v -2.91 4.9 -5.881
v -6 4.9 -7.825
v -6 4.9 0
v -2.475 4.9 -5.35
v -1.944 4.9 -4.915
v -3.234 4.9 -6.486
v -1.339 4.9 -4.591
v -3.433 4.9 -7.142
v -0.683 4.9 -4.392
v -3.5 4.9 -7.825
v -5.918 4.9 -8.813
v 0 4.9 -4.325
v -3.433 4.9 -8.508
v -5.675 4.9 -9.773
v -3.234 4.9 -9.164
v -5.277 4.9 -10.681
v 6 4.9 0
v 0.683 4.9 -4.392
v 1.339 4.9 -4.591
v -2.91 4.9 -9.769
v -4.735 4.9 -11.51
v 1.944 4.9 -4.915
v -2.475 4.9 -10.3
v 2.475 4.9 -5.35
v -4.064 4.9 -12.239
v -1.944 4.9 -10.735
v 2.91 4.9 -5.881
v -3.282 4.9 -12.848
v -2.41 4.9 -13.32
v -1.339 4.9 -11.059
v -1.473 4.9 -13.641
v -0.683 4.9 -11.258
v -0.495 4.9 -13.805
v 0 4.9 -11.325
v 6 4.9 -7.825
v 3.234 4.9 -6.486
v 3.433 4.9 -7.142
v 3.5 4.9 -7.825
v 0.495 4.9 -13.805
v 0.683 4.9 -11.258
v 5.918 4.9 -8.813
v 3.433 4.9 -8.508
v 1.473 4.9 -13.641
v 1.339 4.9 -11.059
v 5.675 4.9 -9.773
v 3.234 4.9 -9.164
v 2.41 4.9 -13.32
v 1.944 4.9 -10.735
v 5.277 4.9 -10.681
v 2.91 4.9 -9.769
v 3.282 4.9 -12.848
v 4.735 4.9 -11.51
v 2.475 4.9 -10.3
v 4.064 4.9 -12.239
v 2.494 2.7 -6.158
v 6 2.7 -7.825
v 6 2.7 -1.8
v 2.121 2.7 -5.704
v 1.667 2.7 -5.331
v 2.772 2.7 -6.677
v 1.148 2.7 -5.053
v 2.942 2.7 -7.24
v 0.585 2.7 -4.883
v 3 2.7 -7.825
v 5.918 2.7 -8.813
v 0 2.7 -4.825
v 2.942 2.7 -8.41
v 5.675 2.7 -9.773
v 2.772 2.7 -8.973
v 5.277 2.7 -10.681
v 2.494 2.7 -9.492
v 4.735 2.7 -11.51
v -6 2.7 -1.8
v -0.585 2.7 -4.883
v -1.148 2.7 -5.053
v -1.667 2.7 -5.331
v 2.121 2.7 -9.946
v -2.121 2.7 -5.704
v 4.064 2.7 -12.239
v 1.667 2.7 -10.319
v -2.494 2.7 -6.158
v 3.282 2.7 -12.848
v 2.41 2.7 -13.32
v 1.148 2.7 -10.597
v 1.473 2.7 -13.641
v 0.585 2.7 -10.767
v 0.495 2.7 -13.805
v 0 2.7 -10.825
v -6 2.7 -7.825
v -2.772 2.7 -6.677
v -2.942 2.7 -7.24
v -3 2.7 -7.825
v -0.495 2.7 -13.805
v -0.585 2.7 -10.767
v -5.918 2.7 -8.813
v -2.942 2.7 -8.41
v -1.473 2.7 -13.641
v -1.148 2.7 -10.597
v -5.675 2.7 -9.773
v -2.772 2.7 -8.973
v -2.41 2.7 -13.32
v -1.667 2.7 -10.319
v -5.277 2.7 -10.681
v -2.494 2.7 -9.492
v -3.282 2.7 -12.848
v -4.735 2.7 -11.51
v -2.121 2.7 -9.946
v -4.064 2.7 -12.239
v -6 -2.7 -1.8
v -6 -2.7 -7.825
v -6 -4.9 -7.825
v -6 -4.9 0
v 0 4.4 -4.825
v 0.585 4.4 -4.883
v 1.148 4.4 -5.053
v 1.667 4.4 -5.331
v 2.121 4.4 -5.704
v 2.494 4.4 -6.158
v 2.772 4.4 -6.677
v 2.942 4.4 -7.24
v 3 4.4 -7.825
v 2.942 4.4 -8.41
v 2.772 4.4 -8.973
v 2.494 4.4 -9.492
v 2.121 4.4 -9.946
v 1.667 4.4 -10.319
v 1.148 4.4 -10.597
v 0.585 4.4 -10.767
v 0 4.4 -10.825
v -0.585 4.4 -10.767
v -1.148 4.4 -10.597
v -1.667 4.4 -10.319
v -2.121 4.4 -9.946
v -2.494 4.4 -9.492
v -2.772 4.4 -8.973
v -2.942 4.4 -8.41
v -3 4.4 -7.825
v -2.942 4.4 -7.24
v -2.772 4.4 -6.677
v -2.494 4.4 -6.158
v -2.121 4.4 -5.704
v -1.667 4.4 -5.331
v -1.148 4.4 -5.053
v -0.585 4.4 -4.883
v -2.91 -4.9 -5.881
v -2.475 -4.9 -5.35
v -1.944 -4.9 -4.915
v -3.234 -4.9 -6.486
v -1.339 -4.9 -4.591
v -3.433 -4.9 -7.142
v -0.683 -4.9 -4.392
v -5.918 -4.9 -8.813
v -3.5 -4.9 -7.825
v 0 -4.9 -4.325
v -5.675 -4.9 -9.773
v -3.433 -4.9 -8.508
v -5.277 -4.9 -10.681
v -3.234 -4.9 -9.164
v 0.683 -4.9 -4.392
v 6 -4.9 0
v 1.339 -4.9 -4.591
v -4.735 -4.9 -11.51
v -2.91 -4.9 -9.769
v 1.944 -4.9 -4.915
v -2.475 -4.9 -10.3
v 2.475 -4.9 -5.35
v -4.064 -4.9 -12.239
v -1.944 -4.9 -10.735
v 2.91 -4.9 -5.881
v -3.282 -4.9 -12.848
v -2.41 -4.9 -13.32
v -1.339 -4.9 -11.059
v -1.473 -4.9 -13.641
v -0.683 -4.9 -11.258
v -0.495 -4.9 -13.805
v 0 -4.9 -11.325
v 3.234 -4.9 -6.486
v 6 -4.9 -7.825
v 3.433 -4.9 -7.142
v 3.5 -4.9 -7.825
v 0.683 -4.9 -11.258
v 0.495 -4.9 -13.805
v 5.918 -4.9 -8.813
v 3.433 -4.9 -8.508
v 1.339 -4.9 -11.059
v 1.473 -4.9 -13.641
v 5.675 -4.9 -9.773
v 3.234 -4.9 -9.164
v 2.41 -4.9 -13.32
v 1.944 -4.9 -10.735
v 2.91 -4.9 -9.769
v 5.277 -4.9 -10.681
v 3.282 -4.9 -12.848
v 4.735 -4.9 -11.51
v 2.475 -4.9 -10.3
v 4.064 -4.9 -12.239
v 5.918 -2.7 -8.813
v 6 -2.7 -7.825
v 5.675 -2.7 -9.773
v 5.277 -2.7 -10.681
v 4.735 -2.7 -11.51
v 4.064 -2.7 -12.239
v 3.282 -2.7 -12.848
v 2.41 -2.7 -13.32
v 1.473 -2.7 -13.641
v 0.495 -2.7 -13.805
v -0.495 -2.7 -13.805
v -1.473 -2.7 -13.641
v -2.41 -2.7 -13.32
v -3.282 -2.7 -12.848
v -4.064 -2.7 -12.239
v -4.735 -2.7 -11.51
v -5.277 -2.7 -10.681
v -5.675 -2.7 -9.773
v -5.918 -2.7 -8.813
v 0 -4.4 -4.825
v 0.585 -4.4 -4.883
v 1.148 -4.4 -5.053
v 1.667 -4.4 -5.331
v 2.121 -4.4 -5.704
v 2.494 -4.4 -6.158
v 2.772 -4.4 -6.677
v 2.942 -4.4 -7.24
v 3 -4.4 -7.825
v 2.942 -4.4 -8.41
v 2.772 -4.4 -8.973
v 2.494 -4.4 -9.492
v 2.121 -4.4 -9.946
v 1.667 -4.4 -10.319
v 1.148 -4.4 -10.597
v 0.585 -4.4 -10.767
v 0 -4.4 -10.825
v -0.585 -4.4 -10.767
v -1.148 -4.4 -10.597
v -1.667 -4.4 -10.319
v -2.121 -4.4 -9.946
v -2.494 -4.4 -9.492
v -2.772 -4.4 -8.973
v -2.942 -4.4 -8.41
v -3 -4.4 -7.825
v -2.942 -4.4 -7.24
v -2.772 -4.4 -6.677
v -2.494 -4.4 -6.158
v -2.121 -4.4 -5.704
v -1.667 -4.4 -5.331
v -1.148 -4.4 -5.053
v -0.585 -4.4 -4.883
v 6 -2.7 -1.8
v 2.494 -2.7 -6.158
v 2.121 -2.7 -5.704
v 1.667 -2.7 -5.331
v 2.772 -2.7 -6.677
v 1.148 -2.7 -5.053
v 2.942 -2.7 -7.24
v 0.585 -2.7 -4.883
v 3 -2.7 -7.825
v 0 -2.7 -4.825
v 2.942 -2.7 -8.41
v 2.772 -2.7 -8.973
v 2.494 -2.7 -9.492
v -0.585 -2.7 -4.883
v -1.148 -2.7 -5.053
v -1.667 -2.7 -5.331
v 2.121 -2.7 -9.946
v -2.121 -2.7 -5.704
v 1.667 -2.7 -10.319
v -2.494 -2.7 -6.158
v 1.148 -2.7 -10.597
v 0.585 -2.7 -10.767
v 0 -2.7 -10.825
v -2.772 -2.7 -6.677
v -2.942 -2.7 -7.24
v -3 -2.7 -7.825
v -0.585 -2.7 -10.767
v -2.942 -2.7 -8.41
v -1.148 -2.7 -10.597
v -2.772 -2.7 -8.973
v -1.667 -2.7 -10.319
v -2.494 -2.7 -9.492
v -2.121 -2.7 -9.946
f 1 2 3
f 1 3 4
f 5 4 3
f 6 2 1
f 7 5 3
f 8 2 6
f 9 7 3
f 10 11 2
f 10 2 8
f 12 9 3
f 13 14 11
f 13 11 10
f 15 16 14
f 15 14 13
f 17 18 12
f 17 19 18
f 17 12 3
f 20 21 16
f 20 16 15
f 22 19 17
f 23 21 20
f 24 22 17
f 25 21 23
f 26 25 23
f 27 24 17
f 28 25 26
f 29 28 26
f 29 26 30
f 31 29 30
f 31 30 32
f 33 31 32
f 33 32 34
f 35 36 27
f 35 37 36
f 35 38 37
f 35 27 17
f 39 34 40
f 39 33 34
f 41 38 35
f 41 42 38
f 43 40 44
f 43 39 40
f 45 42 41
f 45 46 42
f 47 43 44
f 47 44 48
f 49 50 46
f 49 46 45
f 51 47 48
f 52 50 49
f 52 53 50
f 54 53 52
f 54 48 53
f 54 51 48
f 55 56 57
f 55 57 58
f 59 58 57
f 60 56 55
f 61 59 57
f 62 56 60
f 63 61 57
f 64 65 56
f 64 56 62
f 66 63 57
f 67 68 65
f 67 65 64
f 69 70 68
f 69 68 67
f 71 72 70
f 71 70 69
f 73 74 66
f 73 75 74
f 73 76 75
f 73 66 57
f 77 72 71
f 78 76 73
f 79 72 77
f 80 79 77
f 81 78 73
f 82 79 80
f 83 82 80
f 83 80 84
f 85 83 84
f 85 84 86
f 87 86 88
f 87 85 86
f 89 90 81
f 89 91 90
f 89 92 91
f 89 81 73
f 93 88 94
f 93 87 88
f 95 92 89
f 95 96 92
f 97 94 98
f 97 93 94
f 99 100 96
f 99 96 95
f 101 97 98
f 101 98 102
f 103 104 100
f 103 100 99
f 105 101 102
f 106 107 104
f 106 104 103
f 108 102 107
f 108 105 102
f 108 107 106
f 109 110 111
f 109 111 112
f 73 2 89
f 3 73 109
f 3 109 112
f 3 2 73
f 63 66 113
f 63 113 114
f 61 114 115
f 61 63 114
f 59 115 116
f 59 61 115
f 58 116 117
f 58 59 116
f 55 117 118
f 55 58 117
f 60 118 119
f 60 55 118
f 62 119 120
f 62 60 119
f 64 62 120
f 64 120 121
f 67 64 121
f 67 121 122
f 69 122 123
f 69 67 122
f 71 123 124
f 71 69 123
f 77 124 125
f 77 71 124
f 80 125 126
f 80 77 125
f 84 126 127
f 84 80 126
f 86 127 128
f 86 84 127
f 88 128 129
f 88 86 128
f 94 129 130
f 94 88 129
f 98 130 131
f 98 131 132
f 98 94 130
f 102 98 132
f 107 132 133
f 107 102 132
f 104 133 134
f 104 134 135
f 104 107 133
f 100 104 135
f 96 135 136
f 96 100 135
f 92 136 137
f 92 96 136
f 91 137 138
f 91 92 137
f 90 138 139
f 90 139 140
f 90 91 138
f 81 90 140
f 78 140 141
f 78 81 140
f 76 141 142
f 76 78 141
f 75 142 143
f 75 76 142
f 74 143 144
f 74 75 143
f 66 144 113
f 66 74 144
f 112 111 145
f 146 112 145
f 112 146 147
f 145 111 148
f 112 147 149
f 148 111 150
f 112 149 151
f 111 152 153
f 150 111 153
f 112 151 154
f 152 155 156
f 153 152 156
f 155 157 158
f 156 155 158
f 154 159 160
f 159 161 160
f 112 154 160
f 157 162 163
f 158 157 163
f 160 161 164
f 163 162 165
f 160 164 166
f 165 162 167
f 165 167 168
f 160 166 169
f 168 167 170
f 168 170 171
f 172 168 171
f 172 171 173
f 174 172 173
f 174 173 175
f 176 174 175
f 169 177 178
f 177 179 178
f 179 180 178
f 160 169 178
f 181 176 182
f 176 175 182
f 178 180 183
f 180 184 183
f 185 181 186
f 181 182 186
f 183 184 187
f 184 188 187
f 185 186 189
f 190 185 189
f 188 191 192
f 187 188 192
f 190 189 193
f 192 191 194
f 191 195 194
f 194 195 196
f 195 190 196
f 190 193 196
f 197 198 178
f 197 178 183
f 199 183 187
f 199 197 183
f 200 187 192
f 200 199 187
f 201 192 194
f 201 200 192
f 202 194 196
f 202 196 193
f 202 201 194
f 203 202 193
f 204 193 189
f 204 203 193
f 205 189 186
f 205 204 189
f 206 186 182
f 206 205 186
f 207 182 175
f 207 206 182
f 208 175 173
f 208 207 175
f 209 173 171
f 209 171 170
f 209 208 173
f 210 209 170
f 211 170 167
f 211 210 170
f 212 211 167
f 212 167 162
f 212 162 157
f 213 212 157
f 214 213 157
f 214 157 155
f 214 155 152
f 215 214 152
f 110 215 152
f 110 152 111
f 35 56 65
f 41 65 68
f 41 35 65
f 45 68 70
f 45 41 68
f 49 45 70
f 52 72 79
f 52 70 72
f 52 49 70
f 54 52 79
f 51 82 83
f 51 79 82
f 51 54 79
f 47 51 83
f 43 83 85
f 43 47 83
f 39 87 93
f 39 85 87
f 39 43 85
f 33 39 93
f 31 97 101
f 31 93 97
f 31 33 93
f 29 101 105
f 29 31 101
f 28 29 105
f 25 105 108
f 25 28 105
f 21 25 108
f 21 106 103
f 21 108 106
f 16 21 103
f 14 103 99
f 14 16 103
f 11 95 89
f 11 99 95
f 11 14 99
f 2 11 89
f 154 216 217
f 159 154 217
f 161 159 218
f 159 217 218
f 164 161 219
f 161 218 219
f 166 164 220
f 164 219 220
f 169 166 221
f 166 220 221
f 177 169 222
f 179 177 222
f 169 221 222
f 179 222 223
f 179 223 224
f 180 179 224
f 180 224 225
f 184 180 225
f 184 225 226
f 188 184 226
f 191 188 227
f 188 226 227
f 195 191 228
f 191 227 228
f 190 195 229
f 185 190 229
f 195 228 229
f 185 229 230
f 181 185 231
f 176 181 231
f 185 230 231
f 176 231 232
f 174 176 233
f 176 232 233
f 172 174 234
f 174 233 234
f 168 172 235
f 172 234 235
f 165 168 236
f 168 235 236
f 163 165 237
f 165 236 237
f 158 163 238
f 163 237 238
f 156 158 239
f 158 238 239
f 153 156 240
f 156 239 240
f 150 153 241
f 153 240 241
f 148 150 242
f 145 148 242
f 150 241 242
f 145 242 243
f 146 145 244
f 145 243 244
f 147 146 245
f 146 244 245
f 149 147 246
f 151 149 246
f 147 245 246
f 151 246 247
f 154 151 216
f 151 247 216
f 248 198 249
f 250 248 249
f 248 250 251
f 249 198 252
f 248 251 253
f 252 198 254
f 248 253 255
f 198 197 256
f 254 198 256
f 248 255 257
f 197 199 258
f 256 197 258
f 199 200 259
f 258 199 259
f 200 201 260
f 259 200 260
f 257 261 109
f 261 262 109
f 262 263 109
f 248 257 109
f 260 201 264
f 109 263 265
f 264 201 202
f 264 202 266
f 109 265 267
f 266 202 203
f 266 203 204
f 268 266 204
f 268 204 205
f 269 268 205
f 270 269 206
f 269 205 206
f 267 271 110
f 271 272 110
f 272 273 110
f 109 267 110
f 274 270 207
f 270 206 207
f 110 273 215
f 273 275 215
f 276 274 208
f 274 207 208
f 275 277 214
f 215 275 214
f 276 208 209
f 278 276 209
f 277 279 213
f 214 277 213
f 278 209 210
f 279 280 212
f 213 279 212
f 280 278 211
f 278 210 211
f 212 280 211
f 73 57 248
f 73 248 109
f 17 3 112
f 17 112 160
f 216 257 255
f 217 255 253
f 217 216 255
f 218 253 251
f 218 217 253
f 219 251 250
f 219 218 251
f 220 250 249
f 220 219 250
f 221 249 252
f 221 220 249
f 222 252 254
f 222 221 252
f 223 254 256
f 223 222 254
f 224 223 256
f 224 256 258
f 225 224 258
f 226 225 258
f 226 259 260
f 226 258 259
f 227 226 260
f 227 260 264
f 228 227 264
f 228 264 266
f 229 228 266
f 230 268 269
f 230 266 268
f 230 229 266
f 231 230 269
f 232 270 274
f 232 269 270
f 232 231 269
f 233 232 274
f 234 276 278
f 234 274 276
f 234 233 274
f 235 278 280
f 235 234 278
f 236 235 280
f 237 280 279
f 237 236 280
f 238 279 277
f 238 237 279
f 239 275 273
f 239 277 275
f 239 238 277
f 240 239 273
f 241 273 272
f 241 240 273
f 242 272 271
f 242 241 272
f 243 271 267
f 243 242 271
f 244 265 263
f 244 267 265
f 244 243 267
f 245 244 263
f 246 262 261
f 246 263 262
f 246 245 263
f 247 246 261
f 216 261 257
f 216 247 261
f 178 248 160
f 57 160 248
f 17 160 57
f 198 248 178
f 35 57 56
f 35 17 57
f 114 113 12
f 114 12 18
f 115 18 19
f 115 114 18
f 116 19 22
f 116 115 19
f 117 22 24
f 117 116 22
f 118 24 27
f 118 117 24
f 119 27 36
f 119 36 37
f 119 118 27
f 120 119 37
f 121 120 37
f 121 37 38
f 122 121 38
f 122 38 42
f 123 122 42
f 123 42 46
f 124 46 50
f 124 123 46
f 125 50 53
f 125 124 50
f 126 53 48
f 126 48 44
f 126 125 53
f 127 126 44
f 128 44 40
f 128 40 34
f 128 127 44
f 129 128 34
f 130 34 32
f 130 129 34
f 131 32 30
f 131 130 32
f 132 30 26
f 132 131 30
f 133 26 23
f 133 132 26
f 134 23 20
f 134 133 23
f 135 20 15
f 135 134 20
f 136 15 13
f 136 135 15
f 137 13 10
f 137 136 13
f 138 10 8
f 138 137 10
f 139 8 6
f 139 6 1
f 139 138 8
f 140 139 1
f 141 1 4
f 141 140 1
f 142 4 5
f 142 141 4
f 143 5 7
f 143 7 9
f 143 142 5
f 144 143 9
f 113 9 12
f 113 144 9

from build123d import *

# Parameters (mm, degrees)
SKETCH1_R           = 3
BOSS_EXTRUDE1_DEPTH = 4.9
CUT_EXTRUDE1_DEPTH  = 2.7
CHAMFER1_SIZE       = 0.5


with BuildPart() as part:
    # Sketch1 → Boss-Extrude1 (new, symmetric)
    with BuildSketch(Plane(origin=(0, 0, 0), x_dir=(1, 0, 0), z_dir=(0, 1, 0))):
        with BuildLine():
            Line((-6, 7.825), (-6, 0))
            Line((-6, 0), (6, 0))
            Line((6, 0), (6, 7.825))
            ThreePointArc((6, 7.825), (0, 13.825), (-6, 7.825))
        make_face()
        with Locations(Location((0, 7.825, 0), (0, 0, 270))):
            Circle(SKETCH1_R, mode=Mode.SUBTRACT)
    extrude(amount=BOSS_EXTRUDE1_DEPTH, both=True)

    # Sketch3 → Cut-Extrude1 (cut, symmetric)
    with BuildSketch(Plane(origin=(0, 0, 0), x_dir=(1, 0, 0), z_dir=(0, 1, 0))):
        with BuildLine():
            Line((6, 1.8), (-6, 1.8))
            Line((-6, 1.8), (-6, 7.825))
            ThreePointArc((-6, 7.825), (0, 13.825), (6, 7.825))
            Line((6, 7.825), (6, 1.8))
        make_face()
    extrude(amount=CUT_EXTRUDE1_DEPTH, both=True, mode=Mode.SUBTRACT)

    # Chamfer1
    chamfer1_edges = [part.edges().sort_by_distance(p)[0] for p in [
        (0, -4.9, -10.825),
        (0, 4.9, -10.825),
    ]]
    chamfer(chamfer1_edges, length=CHAMFER1_SIZE)


solid = part.part
